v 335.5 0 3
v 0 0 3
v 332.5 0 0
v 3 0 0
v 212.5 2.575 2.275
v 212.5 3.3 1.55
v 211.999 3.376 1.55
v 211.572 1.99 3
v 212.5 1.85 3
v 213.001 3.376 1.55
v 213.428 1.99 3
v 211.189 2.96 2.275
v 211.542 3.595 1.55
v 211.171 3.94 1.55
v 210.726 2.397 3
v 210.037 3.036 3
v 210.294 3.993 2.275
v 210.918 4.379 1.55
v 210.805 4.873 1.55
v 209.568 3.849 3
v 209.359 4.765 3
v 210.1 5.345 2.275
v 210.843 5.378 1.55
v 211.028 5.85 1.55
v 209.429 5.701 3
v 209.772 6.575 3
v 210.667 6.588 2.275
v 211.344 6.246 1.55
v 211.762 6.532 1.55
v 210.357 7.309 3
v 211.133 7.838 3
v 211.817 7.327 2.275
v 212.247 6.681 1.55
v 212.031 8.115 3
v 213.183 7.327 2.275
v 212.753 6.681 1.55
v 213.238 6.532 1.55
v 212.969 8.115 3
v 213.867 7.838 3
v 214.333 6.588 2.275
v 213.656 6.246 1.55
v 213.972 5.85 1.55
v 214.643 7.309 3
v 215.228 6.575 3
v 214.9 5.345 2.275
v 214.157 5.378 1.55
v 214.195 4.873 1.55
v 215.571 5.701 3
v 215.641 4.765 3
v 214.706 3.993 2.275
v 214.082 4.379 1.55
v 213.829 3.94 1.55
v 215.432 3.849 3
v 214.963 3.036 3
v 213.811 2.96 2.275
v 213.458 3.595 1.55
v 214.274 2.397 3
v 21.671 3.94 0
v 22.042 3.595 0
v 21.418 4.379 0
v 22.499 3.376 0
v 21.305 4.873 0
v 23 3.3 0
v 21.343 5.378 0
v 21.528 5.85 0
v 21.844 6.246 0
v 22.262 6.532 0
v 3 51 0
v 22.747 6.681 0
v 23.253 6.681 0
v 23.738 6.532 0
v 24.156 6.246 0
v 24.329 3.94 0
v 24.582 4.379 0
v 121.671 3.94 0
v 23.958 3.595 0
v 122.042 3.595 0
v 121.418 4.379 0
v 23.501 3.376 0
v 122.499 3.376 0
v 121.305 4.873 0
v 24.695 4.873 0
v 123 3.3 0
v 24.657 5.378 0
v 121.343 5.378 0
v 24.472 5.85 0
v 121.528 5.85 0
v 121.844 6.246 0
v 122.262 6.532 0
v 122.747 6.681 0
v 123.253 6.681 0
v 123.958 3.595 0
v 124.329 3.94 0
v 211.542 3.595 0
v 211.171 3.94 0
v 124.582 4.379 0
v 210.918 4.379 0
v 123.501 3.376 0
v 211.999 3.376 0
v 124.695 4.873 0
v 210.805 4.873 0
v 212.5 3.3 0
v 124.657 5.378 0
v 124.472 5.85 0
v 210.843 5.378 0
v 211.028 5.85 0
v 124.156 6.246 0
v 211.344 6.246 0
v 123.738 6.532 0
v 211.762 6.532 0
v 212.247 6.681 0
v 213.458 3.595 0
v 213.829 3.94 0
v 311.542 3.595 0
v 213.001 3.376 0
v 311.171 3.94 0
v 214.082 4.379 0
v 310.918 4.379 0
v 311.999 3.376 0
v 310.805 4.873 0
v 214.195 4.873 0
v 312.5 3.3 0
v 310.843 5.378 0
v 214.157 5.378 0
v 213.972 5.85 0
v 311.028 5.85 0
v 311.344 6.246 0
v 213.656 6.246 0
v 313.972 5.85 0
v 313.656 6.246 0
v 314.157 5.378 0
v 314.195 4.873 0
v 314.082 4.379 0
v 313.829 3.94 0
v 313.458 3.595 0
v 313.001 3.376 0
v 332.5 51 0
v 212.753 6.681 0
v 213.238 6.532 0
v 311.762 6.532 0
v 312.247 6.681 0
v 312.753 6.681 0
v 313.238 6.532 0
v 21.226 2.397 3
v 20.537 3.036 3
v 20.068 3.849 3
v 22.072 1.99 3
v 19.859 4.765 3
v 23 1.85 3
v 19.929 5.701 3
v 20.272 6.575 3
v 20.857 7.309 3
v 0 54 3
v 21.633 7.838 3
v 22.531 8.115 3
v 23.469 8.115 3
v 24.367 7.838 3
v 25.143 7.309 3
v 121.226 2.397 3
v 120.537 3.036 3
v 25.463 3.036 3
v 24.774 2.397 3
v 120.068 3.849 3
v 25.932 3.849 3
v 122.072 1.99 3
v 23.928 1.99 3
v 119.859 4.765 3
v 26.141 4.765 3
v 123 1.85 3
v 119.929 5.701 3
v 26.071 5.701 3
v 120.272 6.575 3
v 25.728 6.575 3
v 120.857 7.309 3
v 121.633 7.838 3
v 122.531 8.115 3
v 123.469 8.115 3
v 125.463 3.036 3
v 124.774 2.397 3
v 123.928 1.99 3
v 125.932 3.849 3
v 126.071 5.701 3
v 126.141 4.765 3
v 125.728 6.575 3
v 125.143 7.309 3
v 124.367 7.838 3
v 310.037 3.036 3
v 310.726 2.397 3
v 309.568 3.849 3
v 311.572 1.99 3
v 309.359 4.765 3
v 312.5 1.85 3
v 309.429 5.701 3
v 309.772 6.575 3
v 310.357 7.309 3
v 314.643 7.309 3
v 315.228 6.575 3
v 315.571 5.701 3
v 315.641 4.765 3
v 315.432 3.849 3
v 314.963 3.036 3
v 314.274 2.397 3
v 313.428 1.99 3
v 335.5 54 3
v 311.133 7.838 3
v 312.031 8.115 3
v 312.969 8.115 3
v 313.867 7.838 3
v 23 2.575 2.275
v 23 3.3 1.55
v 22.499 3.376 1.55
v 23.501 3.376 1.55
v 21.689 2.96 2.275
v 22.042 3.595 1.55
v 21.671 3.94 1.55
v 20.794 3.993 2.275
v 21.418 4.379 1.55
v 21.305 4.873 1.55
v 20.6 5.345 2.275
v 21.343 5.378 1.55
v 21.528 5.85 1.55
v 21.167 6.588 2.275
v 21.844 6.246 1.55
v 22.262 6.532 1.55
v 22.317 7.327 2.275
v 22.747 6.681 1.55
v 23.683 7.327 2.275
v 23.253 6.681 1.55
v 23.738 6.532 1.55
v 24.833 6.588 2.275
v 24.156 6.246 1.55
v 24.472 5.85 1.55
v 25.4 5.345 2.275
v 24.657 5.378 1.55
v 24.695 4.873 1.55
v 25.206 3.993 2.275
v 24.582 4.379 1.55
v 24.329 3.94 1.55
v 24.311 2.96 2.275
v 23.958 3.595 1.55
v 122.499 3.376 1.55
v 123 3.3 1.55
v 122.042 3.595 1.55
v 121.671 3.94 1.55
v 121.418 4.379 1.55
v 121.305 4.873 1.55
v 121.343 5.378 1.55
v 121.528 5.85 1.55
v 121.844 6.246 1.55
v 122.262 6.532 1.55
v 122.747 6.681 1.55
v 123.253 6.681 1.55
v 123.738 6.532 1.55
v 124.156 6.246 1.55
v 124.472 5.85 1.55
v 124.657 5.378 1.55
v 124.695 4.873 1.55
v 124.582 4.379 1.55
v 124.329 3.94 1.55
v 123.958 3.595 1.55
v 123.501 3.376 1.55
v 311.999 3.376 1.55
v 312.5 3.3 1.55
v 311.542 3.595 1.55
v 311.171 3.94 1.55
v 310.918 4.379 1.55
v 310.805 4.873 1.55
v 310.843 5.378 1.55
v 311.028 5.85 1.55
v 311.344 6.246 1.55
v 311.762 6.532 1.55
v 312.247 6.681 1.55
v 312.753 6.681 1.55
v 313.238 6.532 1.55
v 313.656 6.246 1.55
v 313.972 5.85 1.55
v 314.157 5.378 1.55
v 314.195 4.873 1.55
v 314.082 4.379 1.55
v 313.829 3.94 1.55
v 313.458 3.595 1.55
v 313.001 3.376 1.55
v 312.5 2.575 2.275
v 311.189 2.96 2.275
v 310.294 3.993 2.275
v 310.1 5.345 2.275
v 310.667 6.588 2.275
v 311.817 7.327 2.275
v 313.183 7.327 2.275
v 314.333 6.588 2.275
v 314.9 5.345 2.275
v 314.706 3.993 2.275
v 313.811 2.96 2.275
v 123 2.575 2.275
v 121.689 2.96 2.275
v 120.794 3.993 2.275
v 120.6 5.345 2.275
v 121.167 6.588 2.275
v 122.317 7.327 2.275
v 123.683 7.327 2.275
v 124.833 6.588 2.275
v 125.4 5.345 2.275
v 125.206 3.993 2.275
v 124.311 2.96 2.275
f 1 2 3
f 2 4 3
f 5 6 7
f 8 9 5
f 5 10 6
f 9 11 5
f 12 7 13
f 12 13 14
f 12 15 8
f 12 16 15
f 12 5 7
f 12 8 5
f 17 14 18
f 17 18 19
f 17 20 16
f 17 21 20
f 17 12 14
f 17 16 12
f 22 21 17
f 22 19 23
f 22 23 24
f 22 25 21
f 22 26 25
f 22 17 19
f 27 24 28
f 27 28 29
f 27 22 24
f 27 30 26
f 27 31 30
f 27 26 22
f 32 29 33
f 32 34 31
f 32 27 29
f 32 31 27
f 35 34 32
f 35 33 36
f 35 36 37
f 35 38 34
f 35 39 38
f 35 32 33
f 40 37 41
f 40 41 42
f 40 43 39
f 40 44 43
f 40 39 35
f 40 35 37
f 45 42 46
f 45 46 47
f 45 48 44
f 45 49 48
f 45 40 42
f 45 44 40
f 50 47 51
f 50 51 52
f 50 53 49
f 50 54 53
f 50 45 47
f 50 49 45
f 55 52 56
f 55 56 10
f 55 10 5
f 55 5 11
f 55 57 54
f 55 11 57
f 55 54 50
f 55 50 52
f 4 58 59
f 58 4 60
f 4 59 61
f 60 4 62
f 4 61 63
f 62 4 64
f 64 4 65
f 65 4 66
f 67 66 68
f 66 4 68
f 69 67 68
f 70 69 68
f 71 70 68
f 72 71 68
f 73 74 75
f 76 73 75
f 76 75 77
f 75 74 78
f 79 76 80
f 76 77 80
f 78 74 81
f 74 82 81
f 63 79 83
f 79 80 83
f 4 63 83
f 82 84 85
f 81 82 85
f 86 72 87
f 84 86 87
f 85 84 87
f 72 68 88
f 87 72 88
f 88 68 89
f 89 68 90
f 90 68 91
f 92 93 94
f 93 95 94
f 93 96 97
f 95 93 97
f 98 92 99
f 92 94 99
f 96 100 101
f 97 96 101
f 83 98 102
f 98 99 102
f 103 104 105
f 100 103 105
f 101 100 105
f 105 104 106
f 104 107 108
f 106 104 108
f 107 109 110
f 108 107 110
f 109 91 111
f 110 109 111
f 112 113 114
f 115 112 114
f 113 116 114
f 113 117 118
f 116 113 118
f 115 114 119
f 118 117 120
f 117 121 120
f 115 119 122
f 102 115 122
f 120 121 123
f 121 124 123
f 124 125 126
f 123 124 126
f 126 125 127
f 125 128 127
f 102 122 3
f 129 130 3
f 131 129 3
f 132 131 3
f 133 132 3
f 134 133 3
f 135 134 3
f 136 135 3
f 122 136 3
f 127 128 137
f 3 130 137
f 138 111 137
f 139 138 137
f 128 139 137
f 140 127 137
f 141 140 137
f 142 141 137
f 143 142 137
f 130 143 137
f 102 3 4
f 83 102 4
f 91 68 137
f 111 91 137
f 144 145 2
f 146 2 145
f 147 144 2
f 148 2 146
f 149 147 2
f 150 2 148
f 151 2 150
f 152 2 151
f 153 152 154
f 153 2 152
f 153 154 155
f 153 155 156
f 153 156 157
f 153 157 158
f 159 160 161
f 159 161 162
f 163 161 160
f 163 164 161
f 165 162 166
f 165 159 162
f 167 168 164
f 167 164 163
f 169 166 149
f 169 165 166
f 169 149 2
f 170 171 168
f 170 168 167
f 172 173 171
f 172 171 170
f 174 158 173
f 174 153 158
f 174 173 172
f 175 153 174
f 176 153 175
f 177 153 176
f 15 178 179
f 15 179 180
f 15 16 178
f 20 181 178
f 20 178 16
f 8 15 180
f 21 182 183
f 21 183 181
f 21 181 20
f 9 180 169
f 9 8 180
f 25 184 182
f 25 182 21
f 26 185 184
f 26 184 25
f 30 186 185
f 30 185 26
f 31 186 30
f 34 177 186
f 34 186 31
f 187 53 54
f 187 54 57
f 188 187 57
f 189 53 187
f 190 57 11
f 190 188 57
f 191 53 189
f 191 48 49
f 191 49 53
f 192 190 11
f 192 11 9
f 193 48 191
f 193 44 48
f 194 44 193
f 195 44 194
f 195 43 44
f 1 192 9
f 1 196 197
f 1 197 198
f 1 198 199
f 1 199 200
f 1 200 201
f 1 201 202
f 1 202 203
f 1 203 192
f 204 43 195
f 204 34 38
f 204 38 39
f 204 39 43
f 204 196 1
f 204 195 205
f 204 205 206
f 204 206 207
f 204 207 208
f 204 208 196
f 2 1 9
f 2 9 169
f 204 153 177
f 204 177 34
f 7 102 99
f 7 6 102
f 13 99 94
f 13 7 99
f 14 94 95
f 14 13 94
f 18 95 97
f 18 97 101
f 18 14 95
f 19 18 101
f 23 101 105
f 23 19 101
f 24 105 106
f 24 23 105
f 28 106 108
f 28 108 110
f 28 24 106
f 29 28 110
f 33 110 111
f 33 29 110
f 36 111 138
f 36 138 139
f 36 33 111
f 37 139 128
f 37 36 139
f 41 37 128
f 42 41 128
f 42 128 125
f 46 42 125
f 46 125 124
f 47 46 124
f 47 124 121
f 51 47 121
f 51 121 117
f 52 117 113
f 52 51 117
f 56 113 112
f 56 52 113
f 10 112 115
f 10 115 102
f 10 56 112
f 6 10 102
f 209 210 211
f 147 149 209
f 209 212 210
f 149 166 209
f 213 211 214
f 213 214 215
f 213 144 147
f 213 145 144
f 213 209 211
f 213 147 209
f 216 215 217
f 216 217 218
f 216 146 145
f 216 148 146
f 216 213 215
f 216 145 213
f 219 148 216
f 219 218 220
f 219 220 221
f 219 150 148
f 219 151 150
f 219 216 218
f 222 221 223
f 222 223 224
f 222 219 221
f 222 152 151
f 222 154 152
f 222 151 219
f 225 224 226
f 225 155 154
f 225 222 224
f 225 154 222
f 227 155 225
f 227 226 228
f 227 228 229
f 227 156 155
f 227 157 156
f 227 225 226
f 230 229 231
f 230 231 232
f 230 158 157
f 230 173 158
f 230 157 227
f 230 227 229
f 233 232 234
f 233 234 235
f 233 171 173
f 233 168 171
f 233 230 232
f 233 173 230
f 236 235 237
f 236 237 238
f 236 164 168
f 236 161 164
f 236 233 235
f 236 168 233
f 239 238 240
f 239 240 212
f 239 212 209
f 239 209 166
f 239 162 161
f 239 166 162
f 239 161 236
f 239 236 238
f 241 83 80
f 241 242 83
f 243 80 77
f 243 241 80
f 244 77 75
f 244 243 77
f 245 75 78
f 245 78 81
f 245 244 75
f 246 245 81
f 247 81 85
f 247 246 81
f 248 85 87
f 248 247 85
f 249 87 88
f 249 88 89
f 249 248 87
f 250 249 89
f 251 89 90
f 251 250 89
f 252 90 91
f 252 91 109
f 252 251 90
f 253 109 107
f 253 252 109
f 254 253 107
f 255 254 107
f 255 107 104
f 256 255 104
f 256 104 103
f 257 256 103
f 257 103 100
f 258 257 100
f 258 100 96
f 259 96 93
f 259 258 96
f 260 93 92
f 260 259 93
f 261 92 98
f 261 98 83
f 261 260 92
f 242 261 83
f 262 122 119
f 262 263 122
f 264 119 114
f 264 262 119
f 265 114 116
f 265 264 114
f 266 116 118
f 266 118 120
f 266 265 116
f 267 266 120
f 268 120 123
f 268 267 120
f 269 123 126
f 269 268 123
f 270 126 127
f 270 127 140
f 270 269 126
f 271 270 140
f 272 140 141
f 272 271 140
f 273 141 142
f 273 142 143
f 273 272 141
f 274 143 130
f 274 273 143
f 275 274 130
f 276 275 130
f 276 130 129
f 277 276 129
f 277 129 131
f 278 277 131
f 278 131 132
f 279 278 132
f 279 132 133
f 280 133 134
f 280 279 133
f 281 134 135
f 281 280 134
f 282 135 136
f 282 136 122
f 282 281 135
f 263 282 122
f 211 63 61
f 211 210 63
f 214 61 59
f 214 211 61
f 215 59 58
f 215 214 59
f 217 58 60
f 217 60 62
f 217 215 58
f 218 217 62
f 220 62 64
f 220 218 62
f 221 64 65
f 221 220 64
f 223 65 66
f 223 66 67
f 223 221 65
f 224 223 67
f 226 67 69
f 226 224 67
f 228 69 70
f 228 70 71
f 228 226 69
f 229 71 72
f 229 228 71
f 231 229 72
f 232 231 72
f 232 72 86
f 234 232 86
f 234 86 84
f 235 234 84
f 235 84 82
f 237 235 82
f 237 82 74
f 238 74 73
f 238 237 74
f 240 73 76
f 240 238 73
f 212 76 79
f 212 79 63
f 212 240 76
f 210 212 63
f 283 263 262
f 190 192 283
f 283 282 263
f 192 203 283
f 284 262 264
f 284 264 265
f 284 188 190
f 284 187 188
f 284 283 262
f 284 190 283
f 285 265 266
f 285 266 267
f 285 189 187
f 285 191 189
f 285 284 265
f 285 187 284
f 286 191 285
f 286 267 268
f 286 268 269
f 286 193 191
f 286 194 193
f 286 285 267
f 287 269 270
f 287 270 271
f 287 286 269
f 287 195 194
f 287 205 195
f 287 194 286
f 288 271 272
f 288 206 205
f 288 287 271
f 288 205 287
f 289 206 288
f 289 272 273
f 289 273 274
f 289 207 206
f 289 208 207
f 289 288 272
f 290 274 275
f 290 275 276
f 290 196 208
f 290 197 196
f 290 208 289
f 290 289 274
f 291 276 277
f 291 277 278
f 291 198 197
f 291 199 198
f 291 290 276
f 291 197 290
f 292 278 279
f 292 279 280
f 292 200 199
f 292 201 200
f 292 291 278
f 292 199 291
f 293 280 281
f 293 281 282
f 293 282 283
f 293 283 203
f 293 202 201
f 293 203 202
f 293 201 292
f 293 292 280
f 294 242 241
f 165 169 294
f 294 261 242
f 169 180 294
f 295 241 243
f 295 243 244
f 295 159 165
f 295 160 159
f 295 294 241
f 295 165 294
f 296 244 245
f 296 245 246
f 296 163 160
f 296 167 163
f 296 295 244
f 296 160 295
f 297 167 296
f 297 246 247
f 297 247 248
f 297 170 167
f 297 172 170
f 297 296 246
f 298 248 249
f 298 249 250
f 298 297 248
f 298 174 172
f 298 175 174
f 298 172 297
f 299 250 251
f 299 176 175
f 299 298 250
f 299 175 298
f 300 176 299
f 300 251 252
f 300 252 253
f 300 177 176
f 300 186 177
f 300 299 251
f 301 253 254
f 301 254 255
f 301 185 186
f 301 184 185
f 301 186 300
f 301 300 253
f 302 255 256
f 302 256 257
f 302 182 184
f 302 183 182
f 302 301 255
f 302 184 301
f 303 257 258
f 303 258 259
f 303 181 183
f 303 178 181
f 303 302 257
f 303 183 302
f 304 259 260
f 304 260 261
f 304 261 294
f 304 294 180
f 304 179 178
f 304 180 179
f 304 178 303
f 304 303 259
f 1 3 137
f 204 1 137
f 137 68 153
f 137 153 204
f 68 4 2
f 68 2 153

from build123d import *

# Parameters (mm, degrees)
SKETCH1_W                                      = 335.5
SKETCH1_H                                      = 54
BOSS_EXTRUDE1_DEPTH                            = 3
CHAMFER1_SIZE                                  = 3
CSK_FOR_M3_FLAT_HEAD_MACHINE_SCREW1_AT_2_COUNT = 2
CSK_FOR_M3_FLAT_HEAD_MACHINE_SCREW1_AT_2_PITCH = 100
CSK_FOR_M3_FLAT_HEAD_MACHINE_SCREW1_AT_3_COUNT = 2
CSK_FOR_M3_FLAT_HEAD_MACHINE_SCREW1_AT_3_PITCH = 189.5
CSK_FOR_M3_FLAT_HEAD_MACHINE_SCREW1_AT_4_COUNT = 2
CSK_FOR_M3_FLAT_HEAD_MACHINE_SCREW1_AT_4_PITCH = 289.5


with BuildPart() as part:
    # Sketch1 → Boss-Extrude1 (new body)
    with BuildSketch(Plane.XY):
        with Locations((167.75, 27)):
            Rectangle(SKETCH1_W, SKETCH1_H)
    extrude(amount=BOSS_EXTRUDE1_DEPTH)

    # Chamfer1
    chamfer1_edges = [part.edges().sort_by_distance(p)[0] for p in [
        (0, 27, 0),
        (167.75, 54, 0),
        (335.5, 27, 0),
    ]]
    chamfer(chamfer1_edges, length=CHAMFER1_SIZE - 0.0001)  # a hair under: the kernel refuses the full size

    # Sketch3 → CSK for M3 Flat Head Machine Screw1 (revolve, cut)
    with BuildSketch(Plane(origin=(23, 5, 3), x_dir=(0, -1, 0), z_dir=(1, 0, 0))):
        Polygon((0, 0), (0, 3), (1.7, 3), (1.7, 1.45), (3.15, 0), align=None)
    csk_for_m3_flat_head_machine_screw1 = revolve(axis=Axis((23, 5, 9.35), (0, 0, -1)), mode=Mode.SUBTRACT)

    # CSK for M3 Flat Head Machine Screw1 at 2: CSK for M3 Flat Head Machine Screw1 ×2
    with Locations(*[(i * CSK_FOR_M3_FLAT_HEAD_MACHINE_SCREW1_AT_2_PITCH, 0, 0) for i in range(1, CSK_FOR_M3_FLAT_HEAD_MACHINE_SCREW1_AT_2_COUNT)]):
        add(csk_for_m3_flat_head_machine_screw1, mode=Mode.SUBTRACT)

    # CSK for M3 Flat Head Machine Screw1 at 3: CSK for M3 Flat Head Machine Screw1 ×2
    with Locations(*[(i * CSK_FOR_M3_FLAT_HEAD_MACHINE_SCREW1_AT_3_PITCH, 0, 0) for i in range(1, CSK_FOR_M3_FLAT_HEAD_MACHINE_SCREW1_AT_3_COUNT)]):
        add(csk_for_m3_flat_head_machine_screw1, mode=Mode.SUBTRACT)

    # CSK for M3 Flat Head Machine Screw1 at 4: CSK for M3 Flat Head Machine Screw1 ×2
    with Locations(*[(i * CSK_FOR_M3_FLAT_HEAD_MACHINE_SCREW1_AT_4_PITCH, 0, 0) for i in range(1, CSK_FOR_M3_FLAT_HEAD_MACHINE_SCREW1_AT_4_COUNT)]):
        add(csk_for_m3_flat_head_machine_screw1, mode=Mode.SUBTRACT)


solid = part.part
